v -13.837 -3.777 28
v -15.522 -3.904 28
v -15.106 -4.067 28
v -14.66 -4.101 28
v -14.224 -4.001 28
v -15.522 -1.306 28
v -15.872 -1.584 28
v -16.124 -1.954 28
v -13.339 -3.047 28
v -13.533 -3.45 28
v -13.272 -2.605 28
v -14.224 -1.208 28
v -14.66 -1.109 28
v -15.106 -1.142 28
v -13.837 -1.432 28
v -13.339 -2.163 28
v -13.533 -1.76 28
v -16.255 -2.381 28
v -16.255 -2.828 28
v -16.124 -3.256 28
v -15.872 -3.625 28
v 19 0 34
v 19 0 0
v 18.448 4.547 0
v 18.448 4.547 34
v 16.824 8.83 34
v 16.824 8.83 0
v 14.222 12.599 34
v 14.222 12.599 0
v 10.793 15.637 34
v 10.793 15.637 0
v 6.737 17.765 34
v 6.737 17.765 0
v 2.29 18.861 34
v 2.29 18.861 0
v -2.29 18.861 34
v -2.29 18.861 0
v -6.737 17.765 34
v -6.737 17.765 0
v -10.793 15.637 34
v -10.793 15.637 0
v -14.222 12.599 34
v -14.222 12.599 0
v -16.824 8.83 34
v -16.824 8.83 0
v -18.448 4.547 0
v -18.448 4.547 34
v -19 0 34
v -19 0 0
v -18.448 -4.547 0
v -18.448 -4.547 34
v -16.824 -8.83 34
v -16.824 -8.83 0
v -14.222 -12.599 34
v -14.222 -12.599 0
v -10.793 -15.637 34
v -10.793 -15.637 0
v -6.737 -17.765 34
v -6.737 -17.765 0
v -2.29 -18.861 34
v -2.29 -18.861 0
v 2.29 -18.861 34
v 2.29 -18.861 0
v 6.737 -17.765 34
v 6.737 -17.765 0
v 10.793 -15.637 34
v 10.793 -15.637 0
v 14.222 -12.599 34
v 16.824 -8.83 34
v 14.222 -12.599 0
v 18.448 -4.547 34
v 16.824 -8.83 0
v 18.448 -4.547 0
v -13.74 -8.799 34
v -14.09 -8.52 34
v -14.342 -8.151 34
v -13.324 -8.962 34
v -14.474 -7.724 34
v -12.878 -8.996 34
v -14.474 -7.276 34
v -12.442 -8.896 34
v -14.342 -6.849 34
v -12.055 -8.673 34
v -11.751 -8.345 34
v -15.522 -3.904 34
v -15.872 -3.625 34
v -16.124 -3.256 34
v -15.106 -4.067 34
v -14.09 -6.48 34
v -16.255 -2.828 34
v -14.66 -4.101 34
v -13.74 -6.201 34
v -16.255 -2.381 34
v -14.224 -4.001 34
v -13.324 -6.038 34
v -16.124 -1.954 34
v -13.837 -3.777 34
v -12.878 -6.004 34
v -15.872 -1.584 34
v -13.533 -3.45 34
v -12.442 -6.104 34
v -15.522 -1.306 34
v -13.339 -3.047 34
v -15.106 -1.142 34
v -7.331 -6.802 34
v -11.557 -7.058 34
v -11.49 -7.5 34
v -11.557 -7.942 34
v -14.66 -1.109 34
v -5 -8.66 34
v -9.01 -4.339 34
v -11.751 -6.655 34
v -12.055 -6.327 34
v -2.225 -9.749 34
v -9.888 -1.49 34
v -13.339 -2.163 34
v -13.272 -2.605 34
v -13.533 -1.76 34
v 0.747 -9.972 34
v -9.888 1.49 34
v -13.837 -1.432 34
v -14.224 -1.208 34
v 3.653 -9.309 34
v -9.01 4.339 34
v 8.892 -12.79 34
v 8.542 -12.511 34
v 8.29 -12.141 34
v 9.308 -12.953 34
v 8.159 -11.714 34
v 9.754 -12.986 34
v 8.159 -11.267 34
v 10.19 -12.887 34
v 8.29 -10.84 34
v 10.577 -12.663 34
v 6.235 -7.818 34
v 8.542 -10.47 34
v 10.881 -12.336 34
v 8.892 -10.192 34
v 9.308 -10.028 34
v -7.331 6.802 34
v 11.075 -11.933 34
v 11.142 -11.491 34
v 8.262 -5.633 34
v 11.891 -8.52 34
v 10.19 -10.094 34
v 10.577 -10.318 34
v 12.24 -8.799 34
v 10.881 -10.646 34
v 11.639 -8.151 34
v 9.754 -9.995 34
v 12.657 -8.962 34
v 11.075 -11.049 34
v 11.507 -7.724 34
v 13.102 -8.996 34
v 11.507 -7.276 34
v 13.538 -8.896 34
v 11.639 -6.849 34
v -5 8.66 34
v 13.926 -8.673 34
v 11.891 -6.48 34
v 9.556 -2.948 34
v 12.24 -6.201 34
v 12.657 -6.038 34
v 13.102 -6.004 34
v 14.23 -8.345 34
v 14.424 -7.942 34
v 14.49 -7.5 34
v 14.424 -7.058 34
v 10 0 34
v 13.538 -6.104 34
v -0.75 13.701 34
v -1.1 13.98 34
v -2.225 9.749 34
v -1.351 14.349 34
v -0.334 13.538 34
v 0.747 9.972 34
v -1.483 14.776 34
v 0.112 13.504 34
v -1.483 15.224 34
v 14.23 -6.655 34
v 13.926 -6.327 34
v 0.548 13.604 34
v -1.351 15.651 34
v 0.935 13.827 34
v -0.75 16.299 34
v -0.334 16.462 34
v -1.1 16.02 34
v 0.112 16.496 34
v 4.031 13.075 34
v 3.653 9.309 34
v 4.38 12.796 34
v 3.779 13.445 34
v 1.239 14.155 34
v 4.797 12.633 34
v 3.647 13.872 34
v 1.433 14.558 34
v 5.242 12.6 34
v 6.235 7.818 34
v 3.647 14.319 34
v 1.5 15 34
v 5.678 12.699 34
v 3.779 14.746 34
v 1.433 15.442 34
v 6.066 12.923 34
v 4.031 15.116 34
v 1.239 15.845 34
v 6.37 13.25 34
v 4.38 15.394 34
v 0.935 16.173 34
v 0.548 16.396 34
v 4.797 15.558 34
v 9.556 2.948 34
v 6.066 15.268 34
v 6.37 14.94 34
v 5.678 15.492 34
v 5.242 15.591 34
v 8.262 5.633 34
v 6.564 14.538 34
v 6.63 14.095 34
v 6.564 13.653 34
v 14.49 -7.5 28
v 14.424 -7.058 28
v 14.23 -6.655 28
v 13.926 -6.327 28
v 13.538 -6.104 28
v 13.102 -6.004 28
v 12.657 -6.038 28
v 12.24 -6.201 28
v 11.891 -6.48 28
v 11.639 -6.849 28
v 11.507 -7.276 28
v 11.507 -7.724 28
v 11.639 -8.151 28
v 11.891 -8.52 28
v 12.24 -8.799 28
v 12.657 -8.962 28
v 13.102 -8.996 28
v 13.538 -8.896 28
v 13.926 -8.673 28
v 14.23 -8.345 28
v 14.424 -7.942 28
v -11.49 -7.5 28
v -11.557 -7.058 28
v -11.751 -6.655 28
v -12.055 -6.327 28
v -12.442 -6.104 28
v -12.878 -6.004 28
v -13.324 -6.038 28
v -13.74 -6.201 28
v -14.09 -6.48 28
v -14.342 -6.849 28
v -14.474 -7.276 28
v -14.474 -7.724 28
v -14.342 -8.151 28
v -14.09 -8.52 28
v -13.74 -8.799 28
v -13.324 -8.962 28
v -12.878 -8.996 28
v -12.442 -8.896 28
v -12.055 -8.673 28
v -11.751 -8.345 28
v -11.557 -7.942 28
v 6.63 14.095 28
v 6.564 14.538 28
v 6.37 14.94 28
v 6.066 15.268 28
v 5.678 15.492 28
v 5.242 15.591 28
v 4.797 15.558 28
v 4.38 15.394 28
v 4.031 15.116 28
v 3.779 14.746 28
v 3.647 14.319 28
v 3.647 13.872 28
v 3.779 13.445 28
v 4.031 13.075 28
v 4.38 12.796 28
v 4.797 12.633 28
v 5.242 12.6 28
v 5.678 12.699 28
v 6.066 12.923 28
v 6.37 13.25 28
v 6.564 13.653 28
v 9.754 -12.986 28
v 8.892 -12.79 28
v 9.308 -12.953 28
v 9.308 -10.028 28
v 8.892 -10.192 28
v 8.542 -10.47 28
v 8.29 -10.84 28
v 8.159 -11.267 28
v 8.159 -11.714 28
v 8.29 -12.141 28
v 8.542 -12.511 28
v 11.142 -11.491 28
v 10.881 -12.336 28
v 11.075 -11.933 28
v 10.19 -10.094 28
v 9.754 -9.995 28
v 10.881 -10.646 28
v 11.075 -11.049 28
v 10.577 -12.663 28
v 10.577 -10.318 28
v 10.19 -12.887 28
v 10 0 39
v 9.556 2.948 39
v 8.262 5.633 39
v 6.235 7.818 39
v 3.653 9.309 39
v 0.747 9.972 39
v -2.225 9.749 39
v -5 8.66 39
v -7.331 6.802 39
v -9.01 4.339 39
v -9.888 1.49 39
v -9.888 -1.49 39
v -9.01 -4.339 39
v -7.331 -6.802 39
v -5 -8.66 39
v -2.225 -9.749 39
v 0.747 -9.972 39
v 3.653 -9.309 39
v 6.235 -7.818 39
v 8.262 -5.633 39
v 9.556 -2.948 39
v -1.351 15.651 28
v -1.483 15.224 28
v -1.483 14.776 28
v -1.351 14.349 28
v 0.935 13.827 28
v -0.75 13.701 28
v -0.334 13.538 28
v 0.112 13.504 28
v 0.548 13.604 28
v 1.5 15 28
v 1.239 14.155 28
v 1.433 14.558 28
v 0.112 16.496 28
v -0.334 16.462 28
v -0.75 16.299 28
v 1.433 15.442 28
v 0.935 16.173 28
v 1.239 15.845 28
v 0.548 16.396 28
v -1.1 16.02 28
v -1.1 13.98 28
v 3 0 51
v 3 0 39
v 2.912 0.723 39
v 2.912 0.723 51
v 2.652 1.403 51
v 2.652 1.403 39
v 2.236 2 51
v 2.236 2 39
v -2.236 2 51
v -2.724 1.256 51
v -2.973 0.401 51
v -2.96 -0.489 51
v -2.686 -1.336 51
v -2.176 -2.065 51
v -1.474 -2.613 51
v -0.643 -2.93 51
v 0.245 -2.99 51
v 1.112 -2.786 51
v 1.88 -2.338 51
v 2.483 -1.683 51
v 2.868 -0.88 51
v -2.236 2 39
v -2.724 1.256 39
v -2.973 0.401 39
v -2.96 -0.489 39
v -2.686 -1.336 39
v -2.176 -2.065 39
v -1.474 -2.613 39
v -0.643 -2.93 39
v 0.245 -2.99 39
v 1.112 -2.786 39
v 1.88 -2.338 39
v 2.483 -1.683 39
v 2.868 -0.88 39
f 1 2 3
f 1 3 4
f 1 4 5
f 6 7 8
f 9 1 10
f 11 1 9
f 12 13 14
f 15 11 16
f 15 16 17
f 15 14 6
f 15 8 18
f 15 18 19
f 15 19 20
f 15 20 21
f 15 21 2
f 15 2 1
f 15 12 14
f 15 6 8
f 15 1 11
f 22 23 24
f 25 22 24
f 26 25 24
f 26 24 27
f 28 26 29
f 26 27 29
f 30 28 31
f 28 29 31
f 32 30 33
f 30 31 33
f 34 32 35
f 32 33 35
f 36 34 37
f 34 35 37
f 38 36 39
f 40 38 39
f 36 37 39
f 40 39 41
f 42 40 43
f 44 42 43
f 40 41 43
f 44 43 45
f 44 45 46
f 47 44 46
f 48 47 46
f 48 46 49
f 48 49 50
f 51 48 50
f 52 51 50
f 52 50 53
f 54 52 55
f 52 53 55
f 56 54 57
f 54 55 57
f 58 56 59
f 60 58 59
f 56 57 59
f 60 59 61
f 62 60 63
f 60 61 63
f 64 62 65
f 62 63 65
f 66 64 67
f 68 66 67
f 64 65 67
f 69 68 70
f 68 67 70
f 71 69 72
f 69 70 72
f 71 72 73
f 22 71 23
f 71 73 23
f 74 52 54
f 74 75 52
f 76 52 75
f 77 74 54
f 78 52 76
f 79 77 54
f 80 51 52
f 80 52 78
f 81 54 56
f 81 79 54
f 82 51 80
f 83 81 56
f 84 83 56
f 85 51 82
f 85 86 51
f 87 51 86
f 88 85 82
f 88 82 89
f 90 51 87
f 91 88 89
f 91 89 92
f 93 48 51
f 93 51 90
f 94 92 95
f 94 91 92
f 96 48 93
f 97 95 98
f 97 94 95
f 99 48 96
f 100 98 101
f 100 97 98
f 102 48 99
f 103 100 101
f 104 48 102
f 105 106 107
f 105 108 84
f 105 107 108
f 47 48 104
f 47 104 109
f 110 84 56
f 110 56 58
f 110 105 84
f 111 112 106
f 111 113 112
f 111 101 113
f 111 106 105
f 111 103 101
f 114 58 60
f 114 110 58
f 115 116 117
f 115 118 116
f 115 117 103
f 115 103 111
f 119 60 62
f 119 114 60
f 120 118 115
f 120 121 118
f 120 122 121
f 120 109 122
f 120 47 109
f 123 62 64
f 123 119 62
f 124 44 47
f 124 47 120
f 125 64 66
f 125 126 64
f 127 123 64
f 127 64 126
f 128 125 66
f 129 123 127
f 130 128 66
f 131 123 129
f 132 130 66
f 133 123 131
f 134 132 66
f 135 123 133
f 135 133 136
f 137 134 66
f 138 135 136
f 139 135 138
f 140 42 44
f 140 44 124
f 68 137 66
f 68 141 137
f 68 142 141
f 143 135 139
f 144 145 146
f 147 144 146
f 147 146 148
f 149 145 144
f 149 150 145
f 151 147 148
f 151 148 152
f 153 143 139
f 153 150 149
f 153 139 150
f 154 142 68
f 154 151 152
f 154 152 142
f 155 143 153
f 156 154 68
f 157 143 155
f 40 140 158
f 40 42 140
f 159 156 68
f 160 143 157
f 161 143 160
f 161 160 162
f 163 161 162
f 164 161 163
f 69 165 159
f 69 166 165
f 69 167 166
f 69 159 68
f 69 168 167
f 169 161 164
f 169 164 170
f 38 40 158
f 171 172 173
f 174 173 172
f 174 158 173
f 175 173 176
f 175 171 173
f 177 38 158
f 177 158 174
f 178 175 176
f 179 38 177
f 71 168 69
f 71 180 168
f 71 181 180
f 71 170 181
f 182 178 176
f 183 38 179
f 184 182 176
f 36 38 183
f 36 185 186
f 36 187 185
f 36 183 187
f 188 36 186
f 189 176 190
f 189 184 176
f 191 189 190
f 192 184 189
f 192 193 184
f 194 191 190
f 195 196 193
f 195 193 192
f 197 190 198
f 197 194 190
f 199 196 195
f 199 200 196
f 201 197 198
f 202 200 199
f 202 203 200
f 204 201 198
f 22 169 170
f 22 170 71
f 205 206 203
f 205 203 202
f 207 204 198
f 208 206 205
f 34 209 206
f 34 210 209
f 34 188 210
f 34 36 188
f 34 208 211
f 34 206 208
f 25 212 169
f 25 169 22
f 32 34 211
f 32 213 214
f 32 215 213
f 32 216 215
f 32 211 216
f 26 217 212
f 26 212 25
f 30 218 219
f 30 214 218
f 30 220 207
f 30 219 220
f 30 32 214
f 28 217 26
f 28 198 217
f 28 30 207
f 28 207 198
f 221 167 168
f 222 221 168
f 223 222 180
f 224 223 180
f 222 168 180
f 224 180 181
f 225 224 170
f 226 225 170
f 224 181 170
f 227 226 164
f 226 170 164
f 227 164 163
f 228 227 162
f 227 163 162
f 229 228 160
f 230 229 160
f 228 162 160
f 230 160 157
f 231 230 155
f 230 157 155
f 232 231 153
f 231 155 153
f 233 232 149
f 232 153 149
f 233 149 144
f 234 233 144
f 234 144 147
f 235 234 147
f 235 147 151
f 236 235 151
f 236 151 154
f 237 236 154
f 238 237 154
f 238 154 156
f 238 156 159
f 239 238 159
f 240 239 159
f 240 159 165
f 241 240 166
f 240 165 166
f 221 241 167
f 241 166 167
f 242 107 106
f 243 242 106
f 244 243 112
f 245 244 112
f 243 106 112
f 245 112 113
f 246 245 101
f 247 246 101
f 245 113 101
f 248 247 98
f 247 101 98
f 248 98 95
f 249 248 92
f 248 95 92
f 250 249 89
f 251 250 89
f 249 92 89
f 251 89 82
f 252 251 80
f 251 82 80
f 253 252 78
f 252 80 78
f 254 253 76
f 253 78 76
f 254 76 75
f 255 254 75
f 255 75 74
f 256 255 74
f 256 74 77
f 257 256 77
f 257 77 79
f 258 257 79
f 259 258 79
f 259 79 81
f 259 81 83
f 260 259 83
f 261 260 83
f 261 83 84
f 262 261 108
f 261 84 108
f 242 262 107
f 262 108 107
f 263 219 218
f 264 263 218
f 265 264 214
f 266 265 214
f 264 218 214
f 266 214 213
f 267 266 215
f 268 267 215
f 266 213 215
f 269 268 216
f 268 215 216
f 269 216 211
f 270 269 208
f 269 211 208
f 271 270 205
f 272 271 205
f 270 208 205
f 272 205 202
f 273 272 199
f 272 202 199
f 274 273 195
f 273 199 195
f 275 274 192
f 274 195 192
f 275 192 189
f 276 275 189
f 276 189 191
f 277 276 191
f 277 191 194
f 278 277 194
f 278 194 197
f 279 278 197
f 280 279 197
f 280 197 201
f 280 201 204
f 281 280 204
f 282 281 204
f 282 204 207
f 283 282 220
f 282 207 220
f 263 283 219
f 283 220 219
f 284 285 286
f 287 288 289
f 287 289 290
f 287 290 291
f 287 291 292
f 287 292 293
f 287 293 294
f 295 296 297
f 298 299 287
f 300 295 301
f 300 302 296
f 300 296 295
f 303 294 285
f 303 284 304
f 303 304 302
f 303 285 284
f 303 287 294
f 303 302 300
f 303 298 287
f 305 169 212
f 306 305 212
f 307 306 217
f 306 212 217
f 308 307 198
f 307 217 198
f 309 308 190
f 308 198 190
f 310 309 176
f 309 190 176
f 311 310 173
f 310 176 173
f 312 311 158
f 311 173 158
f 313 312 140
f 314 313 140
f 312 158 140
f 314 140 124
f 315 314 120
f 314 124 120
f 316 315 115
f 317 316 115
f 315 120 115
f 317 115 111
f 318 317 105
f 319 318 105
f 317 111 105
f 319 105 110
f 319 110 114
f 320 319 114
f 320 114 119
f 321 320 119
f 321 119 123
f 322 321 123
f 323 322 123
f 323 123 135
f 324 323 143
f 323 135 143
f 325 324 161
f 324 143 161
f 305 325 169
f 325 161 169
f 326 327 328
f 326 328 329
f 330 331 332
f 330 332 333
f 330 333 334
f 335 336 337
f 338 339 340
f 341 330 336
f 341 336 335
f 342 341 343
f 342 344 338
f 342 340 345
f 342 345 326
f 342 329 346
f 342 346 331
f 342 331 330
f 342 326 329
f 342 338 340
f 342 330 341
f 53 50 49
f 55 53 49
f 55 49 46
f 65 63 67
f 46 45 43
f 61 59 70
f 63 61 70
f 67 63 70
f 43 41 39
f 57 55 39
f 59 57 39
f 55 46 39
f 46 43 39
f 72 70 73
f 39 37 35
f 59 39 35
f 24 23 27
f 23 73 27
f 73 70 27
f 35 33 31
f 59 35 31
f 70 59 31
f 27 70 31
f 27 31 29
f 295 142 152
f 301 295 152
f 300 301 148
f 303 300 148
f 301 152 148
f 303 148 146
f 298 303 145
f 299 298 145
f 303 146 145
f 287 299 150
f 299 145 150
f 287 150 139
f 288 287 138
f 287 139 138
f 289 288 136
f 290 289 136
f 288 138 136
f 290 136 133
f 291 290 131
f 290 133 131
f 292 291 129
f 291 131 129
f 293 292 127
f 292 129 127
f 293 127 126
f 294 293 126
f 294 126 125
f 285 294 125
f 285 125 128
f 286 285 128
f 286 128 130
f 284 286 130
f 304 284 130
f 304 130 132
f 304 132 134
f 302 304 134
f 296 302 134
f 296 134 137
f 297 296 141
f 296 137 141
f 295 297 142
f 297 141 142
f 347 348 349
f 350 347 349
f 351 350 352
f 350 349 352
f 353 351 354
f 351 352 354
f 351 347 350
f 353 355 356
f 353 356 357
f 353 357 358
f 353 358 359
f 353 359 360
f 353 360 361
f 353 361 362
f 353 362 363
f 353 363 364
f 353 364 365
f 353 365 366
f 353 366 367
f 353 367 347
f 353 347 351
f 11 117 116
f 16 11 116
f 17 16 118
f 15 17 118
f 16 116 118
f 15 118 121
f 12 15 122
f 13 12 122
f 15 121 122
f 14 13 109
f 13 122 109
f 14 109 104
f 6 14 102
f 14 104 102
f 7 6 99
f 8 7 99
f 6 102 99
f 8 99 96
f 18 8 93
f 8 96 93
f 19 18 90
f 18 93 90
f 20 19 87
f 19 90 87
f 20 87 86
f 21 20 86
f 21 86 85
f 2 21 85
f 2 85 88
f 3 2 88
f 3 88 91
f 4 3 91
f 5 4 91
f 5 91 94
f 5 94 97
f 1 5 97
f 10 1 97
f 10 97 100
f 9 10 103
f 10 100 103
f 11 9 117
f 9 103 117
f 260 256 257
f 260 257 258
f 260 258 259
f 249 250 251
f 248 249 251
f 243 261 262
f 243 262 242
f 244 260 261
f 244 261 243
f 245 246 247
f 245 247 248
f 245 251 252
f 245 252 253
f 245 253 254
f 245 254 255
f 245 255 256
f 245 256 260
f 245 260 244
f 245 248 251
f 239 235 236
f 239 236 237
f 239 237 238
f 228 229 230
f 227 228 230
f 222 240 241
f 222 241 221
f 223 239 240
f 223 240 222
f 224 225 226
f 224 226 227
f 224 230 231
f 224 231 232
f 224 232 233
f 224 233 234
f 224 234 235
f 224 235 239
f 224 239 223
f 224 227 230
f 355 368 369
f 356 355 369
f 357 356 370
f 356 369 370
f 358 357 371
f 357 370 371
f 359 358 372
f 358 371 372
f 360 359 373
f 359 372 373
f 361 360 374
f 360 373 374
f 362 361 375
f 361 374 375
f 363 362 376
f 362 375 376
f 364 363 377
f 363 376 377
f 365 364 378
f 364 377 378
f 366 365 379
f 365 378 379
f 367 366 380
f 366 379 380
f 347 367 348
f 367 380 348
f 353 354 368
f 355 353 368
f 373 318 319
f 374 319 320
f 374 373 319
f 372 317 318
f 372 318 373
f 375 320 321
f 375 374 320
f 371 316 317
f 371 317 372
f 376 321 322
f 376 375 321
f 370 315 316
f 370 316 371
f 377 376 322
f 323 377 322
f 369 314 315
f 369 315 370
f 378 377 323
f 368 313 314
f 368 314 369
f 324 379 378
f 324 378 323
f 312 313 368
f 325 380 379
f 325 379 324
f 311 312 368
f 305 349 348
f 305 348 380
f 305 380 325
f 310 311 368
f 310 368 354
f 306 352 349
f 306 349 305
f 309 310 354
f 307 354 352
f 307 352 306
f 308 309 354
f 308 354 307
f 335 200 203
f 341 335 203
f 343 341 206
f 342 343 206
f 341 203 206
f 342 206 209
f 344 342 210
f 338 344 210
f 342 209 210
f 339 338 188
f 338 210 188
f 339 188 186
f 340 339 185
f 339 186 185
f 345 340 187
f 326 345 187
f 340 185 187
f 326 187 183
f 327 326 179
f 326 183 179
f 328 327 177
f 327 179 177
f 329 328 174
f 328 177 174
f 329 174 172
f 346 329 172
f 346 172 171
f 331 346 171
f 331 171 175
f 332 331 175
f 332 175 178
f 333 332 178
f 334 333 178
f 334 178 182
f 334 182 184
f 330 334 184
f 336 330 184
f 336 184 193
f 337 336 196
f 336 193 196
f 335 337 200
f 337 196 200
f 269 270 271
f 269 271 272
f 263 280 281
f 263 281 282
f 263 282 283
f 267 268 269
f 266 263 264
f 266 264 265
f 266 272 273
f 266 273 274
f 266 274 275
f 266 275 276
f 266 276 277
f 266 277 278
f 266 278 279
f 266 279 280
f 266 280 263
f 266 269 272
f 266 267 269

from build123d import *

# Parameters (mm, degrees)
SKETCH1_R           = 19
BOSS_EXTRUDE1_DEPTH = 34
SKETCH2_R           = 1.5
CUT_EXTRUDE1_DEPTH  = 6
SKETCH3_R           = 10
BOSS_EXTRUDE2_DEPTH = 5
BOSS_EXTRUDE3_DEPTH = 12


with BuildPart() as part:
    # Sketch1 → Boss-Extrude1 (new body)
    with BuildSketch(Plane.XY):
        Circle(SKETCH1_R)
    extrude(amount=BOSS_EXTRUDE1_DEPTH)

    # Sketch2 → Cut-Extrude1 (cut)
    with BuildSketch(Plane.XY.offset(34)):
        with Locations((-12.990381057, -7.5)):
            Circle(SKETCH2_R)
        with Locations((-14.772116295, -2.604722665)):
            Circle(SKETCH2_R)
        with Locations((0, 15)):
            Circle(SKETCH2_R)
        with Locations((5.13030215, 14.095389312)):
            Circle(SKETCH2_R)
        with Locations((12.990381057, -7.5)):
            Circle(SKETCH2_R)
        with Locations((9.641814145, -11.490666647)):
            Circle(SKETCH2_R)
    extrude(amount=-CUT_EXTRUDE1_DEPTH, mode=Mode.SUBTRACT)

    # Sketch3 → Boss-Extrude2 (add)
    with BuildSketch(Plane.XY.offset(34)):
        Circle(SKETCH3_R)
    extrude(amount=BOSS_EXTRUDE2_DEPTH)

    # Sketch4 → Boss-Extrude3 (add)
    with BuildSketch(Plane.XY.offset(39)):
        with BuildLine():
            ThreePointArc((3, 0), (2.802517077, 1.070466269), (2.236067977, 2))
            Line((2.236067977, 2), (-2.236067977, 2))
            ThreePointArc((-2.236067977, 2), (-1.070466269, -2.802517077), (3, 0))
        make_face()
    extrude(amount=BOSS_EXTRUDE3_DEPTH)


solid = part.part
